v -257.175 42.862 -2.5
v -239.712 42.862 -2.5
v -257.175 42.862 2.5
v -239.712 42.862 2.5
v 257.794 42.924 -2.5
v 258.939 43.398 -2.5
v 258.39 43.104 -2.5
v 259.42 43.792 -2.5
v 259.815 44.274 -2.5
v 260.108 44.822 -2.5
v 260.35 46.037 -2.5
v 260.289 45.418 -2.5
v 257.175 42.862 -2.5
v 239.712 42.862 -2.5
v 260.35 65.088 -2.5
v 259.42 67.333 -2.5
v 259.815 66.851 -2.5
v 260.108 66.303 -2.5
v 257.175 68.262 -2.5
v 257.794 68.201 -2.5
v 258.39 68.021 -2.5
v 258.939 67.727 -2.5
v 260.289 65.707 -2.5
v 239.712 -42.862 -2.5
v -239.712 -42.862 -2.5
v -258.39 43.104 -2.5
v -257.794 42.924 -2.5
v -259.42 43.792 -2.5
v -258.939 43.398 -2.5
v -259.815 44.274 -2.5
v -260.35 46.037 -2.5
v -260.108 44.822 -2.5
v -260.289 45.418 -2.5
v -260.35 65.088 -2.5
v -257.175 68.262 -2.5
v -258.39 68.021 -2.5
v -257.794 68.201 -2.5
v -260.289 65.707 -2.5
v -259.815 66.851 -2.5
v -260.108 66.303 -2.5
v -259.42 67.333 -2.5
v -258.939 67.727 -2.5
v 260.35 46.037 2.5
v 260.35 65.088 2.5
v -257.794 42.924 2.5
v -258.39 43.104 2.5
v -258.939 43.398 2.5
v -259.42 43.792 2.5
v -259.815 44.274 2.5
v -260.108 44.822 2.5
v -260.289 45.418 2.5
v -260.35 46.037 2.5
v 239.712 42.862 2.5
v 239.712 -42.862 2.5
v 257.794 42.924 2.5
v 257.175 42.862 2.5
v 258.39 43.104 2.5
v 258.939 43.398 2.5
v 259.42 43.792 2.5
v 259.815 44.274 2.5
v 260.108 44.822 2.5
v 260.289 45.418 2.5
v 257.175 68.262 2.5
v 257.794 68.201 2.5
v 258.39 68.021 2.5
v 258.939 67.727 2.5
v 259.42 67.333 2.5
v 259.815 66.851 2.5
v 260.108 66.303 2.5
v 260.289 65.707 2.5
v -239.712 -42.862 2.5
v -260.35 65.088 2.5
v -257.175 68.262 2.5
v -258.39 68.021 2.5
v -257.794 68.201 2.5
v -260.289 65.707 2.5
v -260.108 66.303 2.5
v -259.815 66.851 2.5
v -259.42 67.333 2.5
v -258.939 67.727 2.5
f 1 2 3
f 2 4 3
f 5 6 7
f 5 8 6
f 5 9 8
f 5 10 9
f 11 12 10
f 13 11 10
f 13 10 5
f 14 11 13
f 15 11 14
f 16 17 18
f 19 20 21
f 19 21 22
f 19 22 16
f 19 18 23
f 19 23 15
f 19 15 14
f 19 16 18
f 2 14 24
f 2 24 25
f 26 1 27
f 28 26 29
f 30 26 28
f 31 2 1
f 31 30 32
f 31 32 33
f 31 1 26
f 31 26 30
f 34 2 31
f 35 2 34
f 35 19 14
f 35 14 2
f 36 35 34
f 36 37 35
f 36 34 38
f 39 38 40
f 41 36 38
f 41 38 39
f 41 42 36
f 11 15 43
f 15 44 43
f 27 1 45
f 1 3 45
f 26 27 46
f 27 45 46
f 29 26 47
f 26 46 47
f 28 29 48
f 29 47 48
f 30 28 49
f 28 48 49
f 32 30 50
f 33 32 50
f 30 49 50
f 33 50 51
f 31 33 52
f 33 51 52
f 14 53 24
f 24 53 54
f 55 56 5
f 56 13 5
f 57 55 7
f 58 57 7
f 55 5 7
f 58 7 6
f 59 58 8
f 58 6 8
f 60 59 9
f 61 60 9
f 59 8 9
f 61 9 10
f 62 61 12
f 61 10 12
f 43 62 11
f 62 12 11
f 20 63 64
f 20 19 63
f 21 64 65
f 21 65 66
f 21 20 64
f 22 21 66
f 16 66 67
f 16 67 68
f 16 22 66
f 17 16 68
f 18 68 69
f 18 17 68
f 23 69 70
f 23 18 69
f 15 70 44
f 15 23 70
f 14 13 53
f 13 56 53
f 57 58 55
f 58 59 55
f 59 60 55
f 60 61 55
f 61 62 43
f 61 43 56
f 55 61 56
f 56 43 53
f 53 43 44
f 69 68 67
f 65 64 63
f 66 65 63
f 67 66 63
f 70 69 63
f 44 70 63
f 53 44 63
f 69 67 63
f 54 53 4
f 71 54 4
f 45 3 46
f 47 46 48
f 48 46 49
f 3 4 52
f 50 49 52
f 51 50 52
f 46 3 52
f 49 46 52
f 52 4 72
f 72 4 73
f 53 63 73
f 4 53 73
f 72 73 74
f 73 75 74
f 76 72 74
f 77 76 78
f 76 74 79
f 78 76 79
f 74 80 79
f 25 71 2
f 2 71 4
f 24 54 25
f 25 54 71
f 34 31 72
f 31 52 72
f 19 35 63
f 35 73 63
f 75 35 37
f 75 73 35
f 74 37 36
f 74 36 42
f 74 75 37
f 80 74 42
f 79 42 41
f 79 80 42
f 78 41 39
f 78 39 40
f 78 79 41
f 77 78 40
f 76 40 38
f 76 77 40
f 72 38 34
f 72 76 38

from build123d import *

# Parameters (mm, degrees)
BOSS_EXTRUDE1_DEPTH = 2.5
FILLET1_R           = 3.175


with BuildPart() as part:
    # Sketch1 → Boss-Extrude1 (new, symmetric)
    with BuildSketch(Plane.XY):
        Polygon((-260.35, 68.2625), (260.35, 68.2625), (260.35, 42.8625), (239.7125, 42.8625), (239.7125, -42.8625), (-239.7125, -42.8625), (-239.7125, 42.8625), (-260.35, 42.8625), align=None)
    extrude(amount=BOSS_EXTRUDE1_DEPTH, both=True)

    # Fillet1
    fillet1_edges = [part.edges().sort_by_distance(p)[0] for p in [
        (-260.35, 68.2625, 0),
        (260.35, 68.2625, 0),
        (260.35, 42.8625, 0),
        (-260.35, 42.8625, 0),
    ]]
    fillet(fillet1_edges, radius=FILLET1_R)


solid = part.part
